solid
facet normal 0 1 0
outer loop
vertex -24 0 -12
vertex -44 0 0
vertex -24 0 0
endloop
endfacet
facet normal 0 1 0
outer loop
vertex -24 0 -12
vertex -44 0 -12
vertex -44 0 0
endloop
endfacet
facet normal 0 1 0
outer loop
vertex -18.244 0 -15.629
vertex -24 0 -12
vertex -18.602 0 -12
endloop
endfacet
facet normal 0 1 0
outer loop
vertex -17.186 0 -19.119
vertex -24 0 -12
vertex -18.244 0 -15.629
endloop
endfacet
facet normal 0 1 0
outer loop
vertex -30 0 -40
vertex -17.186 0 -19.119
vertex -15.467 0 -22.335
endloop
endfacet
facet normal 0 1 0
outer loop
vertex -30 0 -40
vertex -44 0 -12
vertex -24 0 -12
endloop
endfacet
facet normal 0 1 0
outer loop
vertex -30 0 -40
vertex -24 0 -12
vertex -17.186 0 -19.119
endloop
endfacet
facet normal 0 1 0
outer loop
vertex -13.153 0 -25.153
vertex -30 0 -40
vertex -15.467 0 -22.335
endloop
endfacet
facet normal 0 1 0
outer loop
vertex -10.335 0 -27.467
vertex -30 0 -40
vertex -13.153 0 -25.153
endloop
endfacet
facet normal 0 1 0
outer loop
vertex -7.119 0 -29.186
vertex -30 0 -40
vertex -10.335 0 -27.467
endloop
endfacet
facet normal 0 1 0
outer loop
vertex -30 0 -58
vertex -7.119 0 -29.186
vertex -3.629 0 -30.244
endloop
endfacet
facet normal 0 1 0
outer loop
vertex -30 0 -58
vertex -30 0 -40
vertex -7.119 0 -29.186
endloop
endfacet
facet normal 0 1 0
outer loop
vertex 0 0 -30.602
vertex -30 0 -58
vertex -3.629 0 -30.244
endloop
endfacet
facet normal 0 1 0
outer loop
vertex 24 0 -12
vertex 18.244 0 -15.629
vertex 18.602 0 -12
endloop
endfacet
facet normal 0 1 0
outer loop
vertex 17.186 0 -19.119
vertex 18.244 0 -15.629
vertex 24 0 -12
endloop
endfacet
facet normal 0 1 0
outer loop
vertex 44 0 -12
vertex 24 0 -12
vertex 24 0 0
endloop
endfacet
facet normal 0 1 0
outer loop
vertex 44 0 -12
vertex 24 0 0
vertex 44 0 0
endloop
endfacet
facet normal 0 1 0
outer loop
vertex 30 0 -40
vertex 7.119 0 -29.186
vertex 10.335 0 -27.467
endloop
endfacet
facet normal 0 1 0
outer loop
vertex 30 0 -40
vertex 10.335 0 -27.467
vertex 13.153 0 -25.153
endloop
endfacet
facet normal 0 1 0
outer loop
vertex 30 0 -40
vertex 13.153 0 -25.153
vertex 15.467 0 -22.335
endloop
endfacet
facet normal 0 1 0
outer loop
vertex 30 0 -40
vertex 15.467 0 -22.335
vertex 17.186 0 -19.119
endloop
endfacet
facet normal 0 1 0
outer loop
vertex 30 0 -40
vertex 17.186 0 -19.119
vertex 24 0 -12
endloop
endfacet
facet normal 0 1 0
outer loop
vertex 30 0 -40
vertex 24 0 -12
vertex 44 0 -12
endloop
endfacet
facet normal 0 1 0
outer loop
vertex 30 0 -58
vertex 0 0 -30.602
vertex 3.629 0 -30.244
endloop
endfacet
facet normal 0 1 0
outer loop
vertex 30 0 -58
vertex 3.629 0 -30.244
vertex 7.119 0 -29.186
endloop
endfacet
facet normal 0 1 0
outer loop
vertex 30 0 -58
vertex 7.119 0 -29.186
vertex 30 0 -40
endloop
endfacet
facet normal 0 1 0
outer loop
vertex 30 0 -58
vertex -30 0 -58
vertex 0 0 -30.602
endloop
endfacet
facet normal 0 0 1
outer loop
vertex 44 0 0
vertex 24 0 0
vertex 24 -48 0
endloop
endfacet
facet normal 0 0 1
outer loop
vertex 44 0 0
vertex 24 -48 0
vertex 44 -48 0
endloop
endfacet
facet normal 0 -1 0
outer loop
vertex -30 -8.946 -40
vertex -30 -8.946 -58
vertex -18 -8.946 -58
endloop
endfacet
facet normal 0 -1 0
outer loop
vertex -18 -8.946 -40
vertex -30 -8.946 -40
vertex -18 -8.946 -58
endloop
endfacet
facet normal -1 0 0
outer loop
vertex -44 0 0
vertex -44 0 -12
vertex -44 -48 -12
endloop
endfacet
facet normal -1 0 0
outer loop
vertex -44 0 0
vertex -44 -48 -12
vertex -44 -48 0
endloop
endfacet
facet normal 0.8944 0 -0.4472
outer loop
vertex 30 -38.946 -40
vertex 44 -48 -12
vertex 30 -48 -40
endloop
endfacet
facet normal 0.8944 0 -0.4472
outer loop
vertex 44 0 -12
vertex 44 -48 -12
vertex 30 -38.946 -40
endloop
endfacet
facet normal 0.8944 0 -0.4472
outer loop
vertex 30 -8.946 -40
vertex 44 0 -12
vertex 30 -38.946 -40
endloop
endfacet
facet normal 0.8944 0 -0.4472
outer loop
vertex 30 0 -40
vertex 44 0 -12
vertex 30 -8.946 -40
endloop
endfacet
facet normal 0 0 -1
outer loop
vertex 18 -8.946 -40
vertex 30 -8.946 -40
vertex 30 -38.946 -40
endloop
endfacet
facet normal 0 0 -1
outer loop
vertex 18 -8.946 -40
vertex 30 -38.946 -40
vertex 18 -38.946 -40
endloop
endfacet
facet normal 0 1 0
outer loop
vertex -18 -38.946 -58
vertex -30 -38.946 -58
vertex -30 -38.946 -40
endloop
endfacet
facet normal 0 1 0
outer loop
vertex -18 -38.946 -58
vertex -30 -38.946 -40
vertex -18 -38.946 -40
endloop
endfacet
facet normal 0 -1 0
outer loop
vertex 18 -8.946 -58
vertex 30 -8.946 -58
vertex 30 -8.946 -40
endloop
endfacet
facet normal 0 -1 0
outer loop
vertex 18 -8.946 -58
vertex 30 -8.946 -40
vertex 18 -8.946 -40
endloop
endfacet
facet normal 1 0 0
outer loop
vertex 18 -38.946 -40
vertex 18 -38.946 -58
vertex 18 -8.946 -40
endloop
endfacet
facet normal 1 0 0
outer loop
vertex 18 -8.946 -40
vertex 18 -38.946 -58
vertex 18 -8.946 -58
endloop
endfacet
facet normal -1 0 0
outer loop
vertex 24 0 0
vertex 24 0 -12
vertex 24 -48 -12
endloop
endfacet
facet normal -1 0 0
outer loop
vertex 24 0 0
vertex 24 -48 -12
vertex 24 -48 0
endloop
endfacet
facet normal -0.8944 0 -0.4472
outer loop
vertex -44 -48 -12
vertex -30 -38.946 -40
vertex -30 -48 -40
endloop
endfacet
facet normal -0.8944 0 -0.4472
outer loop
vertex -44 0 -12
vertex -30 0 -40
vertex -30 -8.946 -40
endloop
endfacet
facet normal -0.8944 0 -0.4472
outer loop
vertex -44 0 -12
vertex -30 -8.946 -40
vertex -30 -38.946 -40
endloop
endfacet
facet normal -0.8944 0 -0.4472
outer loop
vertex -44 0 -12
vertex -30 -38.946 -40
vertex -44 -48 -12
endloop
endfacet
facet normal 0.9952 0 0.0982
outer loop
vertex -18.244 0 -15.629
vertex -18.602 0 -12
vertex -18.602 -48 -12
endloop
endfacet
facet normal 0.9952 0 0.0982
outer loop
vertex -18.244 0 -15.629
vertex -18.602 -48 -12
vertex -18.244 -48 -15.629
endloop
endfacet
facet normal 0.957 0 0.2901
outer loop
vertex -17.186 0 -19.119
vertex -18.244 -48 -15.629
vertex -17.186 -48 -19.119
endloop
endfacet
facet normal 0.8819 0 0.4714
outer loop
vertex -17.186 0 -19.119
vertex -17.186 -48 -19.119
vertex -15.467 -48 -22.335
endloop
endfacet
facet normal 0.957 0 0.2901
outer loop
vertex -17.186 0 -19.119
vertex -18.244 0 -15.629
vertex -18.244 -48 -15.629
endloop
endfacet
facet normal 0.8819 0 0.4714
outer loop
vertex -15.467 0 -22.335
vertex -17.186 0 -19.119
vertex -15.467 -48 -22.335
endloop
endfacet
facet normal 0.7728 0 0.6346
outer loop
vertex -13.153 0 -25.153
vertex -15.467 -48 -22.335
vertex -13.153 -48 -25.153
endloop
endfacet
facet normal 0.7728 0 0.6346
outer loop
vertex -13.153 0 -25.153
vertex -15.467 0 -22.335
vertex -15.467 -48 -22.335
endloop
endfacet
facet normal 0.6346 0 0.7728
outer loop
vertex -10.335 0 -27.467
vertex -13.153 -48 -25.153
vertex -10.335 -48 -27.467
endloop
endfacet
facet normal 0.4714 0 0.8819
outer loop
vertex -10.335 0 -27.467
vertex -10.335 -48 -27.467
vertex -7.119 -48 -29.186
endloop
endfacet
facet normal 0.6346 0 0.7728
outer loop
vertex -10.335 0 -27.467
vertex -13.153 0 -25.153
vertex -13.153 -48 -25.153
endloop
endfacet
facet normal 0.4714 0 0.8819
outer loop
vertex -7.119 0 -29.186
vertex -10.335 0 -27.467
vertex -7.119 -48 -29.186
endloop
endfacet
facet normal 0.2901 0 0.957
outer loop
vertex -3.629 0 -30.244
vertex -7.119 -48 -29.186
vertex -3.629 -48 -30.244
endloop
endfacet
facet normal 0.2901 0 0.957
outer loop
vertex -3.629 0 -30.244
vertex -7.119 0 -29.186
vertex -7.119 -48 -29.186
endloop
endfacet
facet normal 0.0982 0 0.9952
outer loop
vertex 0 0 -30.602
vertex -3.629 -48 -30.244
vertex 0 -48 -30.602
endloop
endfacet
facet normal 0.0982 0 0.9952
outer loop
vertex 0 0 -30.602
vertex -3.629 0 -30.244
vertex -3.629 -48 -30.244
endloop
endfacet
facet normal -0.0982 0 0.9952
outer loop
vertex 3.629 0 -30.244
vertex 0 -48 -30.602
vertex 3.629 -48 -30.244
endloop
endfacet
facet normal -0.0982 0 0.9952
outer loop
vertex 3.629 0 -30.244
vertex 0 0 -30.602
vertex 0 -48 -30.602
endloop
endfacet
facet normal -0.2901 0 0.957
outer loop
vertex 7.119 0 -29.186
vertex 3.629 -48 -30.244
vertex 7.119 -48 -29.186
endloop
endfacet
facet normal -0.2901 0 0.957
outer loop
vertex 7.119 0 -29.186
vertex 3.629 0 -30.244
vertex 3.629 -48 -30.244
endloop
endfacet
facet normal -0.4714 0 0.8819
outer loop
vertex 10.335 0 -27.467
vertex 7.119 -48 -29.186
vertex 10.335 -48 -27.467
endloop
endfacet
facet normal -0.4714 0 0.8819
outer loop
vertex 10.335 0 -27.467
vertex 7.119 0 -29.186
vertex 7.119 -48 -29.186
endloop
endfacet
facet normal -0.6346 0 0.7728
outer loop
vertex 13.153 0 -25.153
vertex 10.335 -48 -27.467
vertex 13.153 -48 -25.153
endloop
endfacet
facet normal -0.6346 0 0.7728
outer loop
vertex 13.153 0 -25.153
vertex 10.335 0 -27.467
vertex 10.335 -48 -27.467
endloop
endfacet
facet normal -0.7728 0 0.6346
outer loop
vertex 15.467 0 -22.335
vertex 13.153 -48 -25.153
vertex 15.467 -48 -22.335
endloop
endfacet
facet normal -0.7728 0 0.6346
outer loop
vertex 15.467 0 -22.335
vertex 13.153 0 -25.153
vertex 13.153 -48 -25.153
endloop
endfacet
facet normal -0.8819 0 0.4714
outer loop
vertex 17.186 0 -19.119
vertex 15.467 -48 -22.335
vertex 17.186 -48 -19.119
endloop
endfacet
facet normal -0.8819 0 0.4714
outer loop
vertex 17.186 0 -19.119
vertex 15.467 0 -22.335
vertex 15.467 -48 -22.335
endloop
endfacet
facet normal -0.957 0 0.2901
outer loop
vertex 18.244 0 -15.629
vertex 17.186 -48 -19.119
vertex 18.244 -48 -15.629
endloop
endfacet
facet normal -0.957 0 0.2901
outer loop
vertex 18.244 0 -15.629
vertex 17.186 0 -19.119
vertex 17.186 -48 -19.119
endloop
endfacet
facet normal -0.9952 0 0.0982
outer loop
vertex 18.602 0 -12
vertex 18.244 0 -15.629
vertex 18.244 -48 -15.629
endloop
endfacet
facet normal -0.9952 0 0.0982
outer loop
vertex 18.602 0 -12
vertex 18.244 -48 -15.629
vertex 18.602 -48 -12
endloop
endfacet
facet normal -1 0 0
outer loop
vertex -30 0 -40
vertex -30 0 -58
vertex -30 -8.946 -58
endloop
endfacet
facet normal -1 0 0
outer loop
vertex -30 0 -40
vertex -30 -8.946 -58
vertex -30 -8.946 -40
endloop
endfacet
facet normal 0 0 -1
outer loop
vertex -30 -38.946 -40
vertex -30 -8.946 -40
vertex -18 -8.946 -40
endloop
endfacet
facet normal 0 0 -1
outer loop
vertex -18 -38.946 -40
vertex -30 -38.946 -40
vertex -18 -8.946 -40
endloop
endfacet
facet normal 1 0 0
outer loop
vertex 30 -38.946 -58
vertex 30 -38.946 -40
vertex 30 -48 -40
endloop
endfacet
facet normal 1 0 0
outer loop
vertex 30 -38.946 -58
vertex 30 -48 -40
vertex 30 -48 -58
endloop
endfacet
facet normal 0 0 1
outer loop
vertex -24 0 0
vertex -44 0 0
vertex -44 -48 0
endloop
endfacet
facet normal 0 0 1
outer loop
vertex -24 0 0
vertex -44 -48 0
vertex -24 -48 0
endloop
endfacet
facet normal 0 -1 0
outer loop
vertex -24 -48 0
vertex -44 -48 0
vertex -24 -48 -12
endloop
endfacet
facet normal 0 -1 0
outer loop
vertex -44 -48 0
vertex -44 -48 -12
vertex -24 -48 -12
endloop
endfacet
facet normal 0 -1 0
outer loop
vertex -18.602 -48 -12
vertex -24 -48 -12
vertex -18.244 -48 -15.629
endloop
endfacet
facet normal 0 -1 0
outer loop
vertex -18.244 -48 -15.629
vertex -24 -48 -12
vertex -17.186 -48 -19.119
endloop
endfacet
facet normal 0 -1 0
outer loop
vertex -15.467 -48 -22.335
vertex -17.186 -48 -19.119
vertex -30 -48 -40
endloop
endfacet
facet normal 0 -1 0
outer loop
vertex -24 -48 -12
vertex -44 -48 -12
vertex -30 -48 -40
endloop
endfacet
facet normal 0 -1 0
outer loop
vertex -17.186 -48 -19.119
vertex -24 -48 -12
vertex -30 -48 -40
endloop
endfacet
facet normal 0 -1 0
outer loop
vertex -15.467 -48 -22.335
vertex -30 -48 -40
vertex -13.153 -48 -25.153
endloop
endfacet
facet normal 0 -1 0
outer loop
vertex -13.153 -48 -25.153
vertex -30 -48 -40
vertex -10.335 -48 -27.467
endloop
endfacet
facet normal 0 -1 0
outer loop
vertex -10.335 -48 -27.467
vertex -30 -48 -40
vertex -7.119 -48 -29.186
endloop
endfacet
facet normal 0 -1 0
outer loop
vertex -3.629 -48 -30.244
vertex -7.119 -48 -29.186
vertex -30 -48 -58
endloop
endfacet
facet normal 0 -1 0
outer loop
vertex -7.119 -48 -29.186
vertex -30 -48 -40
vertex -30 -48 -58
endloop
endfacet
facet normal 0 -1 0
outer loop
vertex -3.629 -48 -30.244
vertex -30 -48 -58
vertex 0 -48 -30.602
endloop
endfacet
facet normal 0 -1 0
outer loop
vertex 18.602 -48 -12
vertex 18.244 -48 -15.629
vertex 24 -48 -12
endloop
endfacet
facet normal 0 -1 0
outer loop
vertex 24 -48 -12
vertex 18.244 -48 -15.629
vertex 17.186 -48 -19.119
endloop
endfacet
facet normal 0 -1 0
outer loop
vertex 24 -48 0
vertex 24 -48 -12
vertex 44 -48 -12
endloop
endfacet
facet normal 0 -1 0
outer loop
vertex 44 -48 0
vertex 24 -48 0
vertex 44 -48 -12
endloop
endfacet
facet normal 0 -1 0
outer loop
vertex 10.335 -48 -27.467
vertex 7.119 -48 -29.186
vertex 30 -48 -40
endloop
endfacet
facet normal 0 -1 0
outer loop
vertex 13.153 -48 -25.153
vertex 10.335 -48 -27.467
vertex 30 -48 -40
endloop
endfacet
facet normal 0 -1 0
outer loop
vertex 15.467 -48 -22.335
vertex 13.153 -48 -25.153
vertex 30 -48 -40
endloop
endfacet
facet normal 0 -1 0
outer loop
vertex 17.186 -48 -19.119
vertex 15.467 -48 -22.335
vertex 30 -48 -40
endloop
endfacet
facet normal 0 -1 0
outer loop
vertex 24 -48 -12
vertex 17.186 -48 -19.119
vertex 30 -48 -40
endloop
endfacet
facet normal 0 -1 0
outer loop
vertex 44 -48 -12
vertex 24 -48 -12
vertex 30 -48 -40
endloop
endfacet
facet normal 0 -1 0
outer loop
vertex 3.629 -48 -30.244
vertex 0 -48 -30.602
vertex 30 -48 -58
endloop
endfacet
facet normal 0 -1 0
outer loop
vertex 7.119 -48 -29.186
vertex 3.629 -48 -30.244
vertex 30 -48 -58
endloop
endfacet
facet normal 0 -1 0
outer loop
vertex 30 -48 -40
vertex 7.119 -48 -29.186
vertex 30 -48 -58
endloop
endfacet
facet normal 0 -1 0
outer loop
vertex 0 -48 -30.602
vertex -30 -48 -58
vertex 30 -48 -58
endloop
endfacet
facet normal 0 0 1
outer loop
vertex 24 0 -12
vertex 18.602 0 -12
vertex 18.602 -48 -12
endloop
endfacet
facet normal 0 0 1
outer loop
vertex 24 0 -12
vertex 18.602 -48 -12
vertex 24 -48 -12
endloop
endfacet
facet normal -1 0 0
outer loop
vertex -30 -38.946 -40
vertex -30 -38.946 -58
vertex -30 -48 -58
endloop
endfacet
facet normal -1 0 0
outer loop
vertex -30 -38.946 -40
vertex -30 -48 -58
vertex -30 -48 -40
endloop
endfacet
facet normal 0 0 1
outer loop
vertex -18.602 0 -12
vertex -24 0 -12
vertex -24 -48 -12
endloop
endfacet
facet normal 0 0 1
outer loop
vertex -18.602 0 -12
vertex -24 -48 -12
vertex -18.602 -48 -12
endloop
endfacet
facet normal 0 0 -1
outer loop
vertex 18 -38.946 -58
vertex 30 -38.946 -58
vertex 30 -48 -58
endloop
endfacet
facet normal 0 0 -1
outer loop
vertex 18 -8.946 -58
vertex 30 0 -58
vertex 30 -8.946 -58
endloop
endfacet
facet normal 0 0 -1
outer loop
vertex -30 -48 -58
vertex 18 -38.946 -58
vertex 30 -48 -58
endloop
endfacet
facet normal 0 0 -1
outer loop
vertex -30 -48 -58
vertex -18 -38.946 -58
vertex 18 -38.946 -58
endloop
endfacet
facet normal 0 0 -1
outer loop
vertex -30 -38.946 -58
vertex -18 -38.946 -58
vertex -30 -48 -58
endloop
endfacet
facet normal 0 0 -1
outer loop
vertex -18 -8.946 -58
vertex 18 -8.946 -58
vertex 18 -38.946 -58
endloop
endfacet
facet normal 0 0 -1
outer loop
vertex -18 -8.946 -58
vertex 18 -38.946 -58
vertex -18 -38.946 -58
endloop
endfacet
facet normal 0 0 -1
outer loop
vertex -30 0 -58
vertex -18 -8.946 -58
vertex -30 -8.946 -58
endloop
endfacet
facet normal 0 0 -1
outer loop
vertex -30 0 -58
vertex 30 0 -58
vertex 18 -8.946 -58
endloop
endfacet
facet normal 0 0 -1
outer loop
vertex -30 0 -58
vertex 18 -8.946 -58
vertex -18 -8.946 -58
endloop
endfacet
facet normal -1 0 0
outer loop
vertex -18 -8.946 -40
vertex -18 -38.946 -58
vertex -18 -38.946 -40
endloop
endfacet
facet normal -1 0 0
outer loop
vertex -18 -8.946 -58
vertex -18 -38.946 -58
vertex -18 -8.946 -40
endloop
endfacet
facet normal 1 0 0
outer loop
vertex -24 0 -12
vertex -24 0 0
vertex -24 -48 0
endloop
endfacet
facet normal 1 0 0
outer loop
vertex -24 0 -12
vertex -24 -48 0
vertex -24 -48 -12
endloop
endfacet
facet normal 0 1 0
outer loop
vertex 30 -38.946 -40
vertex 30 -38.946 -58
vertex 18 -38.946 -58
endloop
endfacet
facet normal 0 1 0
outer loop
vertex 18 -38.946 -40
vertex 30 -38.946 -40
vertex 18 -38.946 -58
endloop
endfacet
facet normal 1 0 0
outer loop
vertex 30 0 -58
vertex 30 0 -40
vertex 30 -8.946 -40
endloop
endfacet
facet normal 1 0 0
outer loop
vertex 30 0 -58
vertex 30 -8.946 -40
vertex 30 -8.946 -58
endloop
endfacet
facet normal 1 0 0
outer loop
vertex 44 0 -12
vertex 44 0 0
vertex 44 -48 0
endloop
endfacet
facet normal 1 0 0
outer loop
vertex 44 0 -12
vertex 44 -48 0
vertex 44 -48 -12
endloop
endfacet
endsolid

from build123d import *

# Parameters (mm, degrees)
BOSS_EXTRUDE1_DEPTH = 48
SKETCH2_W           = 12
SKETCH2_H           = 30
CUT_EXTRUDE1_DEPTH  = 18


with BuildPart() as part:
    # Sketch1 → Boss-Extrude1 (new body)
    with BuildSketch(Plane(origin=(0, 0, 0), x_dir=(1, 0, 0), z_dir=(0, 1, 0))):
        with BuildLine():
            Line((-44, 0), (-24, 0))
            Line((-24, 0), (-24, 12))
            Line((-24, 12), (-18.601840861, 12))
            ThreePointArc((-18.601840861, 12), (0, 30.601840861), (18.601840861, 12))
            Line((18.601840861, 12), (24, 12))
            Line((24, 12), (24, 0))
            Line((24, 0), (44, 0))
            Line((44, 0), (44, 12))
            Line((44, 12), (30, 40))
            Line((30, 40), (30, 58))
            Line((30, 58), (-30, 58))
            Line((-30, 58), (-30, 40))
            Line((-30, 40), (-44, 12))
            Line((-44, 12), (-44, 0))
        make_face()
    extrude(amount=-BOSS_EXTRUDE1_DEPTH)

    # Sketch2 → Cut-Extrude1 (cut)
    with BuildSketch(Plane(origin=(0, 0, -58), x_dir=(-1, 0, 0), z_dir=(0, 0, -1))):
        with Locations((-24, -23.945628859)):
            Rectangle(SKETCH2_W, SKETCH2_H)
    cut_extrude1 = extrude(amount=-CUT_EXTRUDE1_DEPTH, mode=Mode.SUBTRACT)

    # Mirror1: Cut-Extrude1 across plane
    add(cut_extrude1.mirror(Plane(origin=(0, 0, 0), x_dir=(0, 0, 1), z_dir=(1, 0, 0))), mode=Mode.SUBTRACT)


solid = part.part
